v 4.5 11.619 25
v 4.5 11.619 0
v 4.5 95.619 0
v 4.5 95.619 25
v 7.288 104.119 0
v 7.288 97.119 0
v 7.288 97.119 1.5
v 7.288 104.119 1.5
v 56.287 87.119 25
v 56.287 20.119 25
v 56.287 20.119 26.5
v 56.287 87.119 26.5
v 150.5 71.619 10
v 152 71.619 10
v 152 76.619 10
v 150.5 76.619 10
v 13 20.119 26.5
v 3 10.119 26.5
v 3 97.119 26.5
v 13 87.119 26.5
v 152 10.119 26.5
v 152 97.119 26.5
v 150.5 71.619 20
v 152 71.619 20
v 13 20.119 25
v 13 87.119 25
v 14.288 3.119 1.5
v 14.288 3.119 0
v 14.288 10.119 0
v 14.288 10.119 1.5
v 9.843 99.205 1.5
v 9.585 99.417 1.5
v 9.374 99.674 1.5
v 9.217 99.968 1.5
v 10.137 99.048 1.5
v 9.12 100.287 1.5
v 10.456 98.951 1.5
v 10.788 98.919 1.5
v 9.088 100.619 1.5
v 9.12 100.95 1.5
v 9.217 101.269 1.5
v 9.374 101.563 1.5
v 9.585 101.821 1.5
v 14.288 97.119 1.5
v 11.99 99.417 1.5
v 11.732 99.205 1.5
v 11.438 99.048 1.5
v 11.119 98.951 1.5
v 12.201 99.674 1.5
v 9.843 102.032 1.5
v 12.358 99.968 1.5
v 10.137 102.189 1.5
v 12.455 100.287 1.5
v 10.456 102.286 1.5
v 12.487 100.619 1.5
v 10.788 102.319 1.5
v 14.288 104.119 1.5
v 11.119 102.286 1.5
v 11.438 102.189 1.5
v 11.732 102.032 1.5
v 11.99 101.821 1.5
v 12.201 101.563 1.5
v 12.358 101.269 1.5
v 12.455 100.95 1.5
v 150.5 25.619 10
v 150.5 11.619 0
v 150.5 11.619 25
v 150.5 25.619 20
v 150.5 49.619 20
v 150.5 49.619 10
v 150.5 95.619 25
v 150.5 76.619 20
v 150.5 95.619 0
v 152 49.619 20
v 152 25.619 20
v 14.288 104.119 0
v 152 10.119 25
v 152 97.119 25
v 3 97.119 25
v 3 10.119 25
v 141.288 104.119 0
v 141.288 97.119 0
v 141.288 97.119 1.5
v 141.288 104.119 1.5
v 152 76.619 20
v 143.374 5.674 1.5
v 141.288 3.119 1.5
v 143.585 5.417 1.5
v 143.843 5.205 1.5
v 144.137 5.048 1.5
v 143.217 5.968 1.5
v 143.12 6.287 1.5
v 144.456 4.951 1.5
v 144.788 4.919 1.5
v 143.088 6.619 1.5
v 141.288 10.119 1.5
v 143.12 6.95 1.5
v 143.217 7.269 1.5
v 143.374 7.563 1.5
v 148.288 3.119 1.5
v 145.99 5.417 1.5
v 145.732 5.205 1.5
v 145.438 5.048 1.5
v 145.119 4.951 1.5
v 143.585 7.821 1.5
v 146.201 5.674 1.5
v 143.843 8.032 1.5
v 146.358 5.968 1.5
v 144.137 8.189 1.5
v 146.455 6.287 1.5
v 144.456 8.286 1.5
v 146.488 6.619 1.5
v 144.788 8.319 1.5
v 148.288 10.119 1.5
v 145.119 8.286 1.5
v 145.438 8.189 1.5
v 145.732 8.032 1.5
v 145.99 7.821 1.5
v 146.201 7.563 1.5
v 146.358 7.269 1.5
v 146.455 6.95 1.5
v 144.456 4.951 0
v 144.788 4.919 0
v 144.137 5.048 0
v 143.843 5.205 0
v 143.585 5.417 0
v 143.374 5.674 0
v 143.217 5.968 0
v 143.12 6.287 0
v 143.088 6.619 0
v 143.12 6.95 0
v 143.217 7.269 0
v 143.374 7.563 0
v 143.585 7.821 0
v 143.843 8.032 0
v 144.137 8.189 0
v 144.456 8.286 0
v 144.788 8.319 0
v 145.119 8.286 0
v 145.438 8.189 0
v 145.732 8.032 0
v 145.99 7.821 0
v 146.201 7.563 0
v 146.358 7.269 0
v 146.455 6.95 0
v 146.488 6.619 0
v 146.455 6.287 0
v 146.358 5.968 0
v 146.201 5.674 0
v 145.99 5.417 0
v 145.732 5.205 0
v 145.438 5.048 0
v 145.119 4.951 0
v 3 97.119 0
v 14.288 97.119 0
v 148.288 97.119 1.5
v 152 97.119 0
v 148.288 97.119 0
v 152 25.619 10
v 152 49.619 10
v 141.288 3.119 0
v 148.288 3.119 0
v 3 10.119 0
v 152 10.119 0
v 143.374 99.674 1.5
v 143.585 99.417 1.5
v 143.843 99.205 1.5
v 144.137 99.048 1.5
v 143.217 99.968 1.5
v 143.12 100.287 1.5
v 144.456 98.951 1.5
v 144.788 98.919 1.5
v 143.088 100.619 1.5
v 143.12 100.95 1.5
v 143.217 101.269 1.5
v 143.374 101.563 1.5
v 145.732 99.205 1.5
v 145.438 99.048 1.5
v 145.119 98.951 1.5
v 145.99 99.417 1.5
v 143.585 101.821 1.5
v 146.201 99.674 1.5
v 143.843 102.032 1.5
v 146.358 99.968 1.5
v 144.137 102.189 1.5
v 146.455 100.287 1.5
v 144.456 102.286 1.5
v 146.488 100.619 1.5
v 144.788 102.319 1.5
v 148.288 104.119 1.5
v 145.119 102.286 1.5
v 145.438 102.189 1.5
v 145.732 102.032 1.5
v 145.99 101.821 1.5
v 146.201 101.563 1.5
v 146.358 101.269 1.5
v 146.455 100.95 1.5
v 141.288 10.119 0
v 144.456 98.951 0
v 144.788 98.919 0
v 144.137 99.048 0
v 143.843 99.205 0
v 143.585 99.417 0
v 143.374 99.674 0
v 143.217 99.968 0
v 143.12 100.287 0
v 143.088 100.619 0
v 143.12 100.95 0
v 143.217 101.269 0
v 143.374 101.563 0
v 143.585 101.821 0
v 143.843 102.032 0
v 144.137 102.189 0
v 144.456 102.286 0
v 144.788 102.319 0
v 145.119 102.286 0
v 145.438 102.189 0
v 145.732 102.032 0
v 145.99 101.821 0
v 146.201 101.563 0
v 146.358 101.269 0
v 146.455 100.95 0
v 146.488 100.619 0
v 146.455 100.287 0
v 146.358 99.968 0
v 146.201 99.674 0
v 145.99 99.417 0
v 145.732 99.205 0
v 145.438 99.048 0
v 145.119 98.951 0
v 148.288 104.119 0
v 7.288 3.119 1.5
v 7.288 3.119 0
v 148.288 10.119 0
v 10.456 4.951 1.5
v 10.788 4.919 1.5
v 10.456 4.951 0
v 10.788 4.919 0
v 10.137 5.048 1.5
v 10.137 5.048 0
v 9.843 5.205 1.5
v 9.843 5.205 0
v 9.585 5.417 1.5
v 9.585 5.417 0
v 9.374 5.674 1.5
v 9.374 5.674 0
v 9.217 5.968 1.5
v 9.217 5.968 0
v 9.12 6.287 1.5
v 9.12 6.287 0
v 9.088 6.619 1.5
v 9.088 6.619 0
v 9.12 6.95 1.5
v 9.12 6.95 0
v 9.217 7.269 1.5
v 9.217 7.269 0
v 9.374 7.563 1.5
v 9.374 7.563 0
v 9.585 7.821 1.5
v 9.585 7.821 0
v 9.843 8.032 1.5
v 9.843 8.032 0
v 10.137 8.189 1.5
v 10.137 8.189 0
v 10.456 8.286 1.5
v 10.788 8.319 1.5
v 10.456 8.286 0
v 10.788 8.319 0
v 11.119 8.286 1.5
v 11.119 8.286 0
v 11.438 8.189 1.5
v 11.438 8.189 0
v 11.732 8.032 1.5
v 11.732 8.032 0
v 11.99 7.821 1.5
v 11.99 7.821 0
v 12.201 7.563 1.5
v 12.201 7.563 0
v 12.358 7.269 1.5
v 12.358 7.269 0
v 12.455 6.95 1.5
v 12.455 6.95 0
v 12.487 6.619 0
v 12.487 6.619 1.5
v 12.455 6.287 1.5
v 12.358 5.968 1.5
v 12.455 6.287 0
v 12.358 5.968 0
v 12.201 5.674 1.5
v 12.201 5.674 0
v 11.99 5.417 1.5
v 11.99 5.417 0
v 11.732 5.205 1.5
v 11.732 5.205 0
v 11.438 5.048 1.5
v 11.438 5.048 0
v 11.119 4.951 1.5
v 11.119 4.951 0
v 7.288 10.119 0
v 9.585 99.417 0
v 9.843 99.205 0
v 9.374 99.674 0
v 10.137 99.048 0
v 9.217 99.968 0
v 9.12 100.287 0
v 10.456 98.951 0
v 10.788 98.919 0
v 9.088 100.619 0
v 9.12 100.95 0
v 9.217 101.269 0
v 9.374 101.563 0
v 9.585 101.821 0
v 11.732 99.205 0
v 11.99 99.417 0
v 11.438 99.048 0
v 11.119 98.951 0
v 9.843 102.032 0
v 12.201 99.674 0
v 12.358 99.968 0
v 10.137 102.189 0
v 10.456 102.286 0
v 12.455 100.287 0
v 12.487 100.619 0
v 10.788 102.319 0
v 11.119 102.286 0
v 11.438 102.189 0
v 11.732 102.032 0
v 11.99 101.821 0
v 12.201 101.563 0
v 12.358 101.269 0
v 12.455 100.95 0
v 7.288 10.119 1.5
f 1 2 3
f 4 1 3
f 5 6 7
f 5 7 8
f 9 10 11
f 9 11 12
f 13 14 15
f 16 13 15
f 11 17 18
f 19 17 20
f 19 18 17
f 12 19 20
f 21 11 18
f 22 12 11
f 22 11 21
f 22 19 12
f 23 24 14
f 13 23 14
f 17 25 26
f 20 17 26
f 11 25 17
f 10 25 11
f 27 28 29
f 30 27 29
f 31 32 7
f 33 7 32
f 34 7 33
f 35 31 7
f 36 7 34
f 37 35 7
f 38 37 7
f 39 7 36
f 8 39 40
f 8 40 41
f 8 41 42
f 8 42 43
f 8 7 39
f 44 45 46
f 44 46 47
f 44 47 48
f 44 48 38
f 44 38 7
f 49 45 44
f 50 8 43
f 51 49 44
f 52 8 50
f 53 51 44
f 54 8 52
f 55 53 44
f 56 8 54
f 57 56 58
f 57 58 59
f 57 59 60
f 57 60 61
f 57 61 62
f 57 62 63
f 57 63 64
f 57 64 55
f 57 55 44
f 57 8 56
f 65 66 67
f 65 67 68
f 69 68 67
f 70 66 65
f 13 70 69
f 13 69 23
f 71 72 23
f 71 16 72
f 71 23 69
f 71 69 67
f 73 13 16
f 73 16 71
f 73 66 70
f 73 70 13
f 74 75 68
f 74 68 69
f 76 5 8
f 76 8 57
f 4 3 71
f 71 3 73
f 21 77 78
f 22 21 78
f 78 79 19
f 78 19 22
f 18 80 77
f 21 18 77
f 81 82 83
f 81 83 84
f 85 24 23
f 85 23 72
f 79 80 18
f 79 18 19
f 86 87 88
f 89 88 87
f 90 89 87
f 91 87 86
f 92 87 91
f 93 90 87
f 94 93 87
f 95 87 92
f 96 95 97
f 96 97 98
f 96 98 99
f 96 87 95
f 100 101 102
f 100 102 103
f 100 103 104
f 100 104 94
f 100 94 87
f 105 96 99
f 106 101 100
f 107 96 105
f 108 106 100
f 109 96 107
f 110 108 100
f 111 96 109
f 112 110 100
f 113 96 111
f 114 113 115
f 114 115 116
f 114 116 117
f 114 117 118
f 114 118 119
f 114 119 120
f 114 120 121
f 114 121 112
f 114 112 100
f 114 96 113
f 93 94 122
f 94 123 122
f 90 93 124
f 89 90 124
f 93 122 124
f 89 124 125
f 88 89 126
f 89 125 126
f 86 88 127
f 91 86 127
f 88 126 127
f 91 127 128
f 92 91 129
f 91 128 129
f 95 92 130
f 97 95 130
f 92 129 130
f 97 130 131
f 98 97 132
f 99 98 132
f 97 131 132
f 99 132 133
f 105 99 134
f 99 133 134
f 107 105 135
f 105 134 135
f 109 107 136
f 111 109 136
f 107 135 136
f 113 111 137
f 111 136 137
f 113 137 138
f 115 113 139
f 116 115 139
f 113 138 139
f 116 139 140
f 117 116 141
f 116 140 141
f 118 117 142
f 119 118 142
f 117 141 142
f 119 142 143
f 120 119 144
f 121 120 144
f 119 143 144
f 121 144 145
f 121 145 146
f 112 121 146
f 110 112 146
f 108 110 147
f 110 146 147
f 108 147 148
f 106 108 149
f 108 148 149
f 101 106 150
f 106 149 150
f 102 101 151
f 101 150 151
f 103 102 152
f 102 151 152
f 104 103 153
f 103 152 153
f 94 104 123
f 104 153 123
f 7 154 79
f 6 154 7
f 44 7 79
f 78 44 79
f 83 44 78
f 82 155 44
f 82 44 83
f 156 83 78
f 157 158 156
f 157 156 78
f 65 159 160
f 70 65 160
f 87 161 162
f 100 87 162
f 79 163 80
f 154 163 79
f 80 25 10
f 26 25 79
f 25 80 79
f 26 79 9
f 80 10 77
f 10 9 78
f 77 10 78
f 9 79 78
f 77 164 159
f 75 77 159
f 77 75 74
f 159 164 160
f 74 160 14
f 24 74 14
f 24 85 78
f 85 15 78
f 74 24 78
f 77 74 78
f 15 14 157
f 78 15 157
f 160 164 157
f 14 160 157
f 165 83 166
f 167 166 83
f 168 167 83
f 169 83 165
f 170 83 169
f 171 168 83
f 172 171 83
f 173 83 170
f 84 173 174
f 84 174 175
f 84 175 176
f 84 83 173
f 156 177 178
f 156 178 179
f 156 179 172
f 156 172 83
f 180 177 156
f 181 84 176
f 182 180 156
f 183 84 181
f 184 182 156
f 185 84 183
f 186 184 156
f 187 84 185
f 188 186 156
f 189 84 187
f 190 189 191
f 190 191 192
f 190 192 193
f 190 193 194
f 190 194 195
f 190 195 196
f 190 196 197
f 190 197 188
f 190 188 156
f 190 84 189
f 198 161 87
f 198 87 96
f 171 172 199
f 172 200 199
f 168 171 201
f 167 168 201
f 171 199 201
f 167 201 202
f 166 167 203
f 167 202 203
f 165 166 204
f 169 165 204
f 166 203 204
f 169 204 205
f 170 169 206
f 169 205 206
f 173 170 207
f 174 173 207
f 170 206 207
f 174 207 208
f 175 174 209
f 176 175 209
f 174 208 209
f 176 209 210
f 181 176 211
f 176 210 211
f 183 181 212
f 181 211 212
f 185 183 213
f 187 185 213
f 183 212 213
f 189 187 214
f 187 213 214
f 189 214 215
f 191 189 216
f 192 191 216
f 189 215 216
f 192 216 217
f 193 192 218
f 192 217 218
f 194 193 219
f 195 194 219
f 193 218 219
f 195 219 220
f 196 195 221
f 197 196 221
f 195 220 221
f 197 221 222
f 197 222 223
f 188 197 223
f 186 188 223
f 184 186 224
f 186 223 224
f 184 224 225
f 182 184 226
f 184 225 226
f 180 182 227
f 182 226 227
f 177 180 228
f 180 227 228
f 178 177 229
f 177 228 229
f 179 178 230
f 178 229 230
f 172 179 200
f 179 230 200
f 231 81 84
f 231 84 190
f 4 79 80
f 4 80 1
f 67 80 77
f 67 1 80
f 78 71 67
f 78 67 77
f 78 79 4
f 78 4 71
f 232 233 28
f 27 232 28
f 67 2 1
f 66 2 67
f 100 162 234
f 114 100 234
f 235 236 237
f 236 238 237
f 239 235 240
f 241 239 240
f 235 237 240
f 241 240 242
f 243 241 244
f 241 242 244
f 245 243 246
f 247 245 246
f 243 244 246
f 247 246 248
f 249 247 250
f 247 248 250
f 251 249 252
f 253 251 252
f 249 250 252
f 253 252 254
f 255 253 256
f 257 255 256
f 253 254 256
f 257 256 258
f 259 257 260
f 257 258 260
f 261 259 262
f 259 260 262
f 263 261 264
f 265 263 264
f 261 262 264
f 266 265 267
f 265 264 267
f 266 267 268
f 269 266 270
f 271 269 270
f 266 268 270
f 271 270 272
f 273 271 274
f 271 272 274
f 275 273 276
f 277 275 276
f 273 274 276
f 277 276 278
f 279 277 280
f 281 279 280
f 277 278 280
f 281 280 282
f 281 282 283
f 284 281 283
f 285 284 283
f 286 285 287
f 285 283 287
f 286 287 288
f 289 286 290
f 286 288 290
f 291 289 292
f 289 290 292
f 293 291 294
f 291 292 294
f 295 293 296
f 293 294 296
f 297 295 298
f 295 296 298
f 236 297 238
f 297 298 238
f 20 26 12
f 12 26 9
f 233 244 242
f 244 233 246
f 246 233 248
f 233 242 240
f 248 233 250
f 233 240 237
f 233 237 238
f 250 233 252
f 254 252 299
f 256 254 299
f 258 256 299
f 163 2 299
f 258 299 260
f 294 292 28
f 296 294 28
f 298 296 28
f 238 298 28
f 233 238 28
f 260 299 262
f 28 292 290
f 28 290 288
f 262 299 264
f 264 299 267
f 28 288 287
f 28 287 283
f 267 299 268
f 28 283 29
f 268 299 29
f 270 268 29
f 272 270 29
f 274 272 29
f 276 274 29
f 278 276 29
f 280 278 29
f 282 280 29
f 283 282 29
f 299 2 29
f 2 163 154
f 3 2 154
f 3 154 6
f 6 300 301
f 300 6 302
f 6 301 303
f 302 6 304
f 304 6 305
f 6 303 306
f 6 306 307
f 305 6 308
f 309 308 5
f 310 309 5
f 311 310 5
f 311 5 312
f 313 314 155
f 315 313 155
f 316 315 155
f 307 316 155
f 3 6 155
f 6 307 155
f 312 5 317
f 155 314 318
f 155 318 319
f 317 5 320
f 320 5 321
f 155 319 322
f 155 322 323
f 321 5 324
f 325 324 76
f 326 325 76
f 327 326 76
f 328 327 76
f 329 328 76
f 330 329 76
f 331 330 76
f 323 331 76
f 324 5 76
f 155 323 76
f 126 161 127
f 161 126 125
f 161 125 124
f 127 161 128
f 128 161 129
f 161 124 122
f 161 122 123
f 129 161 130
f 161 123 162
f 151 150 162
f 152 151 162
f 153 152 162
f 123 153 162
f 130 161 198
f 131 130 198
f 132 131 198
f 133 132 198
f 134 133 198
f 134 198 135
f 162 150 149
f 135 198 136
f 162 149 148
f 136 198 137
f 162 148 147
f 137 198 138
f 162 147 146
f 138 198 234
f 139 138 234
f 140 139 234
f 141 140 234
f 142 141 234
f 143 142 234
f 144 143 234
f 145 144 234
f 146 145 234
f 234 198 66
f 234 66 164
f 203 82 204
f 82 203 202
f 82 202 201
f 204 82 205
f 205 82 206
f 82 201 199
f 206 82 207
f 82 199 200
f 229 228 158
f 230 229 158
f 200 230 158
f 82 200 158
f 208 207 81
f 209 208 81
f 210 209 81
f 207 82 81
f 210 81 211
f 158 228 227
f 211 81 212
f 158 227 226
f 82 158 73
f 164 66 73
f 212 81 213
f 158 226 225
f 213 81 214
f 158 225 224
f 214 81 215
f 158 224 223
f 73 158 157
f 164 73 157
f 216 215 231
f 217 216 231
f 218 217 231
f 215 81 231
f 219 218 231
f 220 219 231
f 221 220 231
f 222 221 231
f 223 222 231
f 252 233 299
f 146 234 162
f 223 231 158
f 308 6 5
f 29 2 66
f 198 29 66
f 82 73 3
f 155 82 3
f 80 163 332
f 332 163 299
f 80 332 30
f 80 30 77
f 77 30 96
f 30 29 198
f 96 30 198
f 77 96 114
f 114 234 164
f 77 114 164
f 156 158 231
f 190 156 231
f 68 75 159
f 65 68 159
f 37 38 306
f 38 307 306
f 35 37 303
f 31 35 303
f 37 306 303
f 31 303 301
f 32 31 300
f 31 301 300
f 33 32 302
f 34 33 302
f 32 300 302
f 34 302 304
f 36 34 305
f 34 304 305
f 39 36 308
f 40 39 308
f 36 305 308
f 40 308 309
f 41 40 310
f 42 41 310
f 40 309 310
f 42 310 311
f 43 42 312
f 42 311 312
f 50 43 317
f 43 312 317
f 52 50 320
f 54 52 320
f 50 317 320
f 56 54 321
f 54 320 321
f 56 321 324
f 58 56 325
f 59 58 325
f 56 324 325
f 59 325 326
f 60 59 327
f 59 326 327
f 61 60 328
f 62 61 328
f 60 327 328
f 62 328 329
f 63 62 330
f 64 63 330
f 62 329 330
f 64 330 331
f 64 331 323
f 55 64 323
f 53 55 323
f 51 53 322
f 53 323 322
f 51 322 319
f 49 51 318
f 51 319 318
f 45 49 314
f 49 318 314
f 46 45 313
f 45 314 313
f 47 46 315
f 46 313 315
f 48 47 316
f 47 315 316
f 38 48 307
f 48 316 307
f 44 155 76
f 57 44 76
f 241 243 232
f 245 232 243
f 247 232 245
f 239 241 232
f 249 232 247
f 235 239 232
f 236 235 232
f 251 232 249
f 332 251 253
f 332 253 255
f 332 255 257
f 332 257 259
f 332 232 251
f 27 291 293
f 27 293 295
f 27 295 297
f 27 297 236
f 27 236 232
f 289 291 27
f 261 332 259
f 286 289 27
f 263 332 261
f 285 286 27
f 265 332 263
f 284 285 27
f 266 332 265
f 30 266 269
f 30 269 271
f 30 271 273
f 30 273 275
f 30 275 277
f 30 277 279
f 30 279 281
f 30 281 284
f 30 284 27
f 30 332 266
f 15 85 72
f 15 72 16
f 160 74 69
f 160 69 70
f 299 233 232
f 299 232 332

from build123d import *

# Parameters (mm, degrees)
SKETCH1_W                     = 149
SKETCH1_H                     = 87
SKETCH1_W_2                   = 146
SKETCH1_H_2                   = 84
BOSS_EXTRUDE1_DEPTH           = 25
SKETCH2_W                     = 149
SKETCH2_H                     = 87
SKETCH2_W_2                   = 43.2875
SKETCH2_H_2                   = 67
BOSS_EXTRUDE2_DEPTH           = 1.5
SKETCH3_W                     = 7
SKETCH3_H                     = 7
BOSS_EXTRUDE3_DEPTH           = 1.5
SKETCH5_W                     = 1.7
SKETCH5_H                     = 1.5
M3_CLEARANCE_HOLE1_AT_2_COUNT = 2
M3_CLEARANCE_HOLE1_AT_2_PITCH = 94
M3_CLEARANCE_HOLE1_AT_3_COUNT = 2
M3_CLEARANCE_HOLE1_AT_3_PITCH = 134
M3_CLEARANCE_HOLE1_AT_4_COUNT = 2
M3_CLEARANCE_HOLE1_AT_4_PITCH = 163.682619725
SKETCH9_W                     = 10
SKETCH9_H                     = 24
SKETCH9_H_2                   = 5
CUT_EXTRUDE1_DEPTH            = 1.5


with BuildPart() as part:
    # Sketch1 → Boss-Extrude1 (new body)
    with BuildSketch(Plane.XY):
        with Locations((77.5, 53.618750014)):
            Rectangle(SKETCH1_W, SKETCH1_H)
        with Locations((77.5, 53.618750014)):
            Rectangle(SKETCH1_W_2, SKETCH1_H_2, mode=Mode.SUBTRACT)
    extrude(amount=BOSS_EXTRUDE1_DEPTH)

    # Sketch3 → Boss-Extrude3 (add)
    with BuildSketch(Plane.XY):
        with Locations((10.7875, 100.618750014)):
            Rectangle(SKETCH3_W, SKETCH3_H)
        with Locations((10.7875, 6.618750014)):
            Rectangle(SKETCH3_W, SKETCH3_H)
        with Locations((144.7875, 6.618750014)):
            Rectangle(SKETCH3_W, SKETCH3_H)
        with Locations((144.7875, 100.618750014)):
            Rectangle(SKETCH3_W, SKETCH3_H)
    extrude(amount=BOSS_EXTRUDE3_DEPTH)

    # Sketch5 → M3 Clearance Hole1 (revolve, cut)
    with BuildSketch(Plane(origin=(10.7875, 6.618750014, 1.5), x_dir=(0, -1, 0), z_dir=(1, 0, 0))):
        with Locations((0.85, 0.75)):
            Rectangle(SKETCH5_W, SKETCH5_H)
    m3_clearance_hole1 = revolve(axis=Axis((10.7875, 6.618750014, 7.85), (0, 0, -1)), mode=Mode.SUBTRACT)

    # M3 Clearance Hole1 at 2: M3 Clearance Hole1 ×2
    with Locations(*[(0, i * M3_CLEARANCE_HOLE1_AT_2_PITCH, 0) for i in range(1, M3_CLEARANCE_HOLE1_AT_2_COUNT)]):
        add(m3_clearance_hole1, mode=Mode.SUBTRACT)

    # M3 Clearance Hole1 at 3: M3 Clearance Hole1 ×2
    with Locations(*[(i * M3_CLEARANCE_HOLE1_AT_3_PITCH, 0, 0) for i in range(1, M3_CLEARANCE_HOLE1_AT_3_COUNT)]):
        add(m3_clearance_hole1, mode=Mode.SUBTRACT)

    # M3 Clearance Hole1 at 4: M3 Clearance Hole1 ×2
    with Locations(*[Vector(0.8186574739897755, 0.5742821086196923, 0) * (i * M3_CLEARANCE_HOLE1_AT_4_PITCH) for i in range(1, M3_CLEARANCE_HOLE1_AT_4_COUNT)]):
        add(m3_clearance_hole1, mode=Mode.SUBTRACT)

    # Sketch9 → Cut-Extrude1 (cut)
    with BuildSketch(Plane(origin=(152, 0, 0), x_dir=(0, 0, -1), z_dir=(1, 0, 0))):
        with Locations((-15, 37.618750014)):
            Rectangle(SKETCH9_W, SKETCH9_H)
        with Locations((-15, 74.118750014)):
            Rectangle(SKETCH9_W, SKETCH9_H_2)
    extrude(amount=-CUT_EXTRUDE1_DEPTH, mode=Mode.SUBTRACT)


with BuildPart() as body_2:
    # Sketch2 → Boss-Extrude2 (new body)
    with BuildSketch(Plane.XY.offset(25)):
        with Locations((77.5, 53.618750014)):
            Rectangle(SKETCH2_W, SKETCH2_H)
        with Locations((34.64375, 53.618750014)):
            Rectangle(SKETCH2_W_2, SKETCH2_H_2, mode=Mode.SUBTRACT)
    extrude(amount=BOSS_EXTRUDE2_DEPTH)


solid = Compound([part.part, body_2.part])
